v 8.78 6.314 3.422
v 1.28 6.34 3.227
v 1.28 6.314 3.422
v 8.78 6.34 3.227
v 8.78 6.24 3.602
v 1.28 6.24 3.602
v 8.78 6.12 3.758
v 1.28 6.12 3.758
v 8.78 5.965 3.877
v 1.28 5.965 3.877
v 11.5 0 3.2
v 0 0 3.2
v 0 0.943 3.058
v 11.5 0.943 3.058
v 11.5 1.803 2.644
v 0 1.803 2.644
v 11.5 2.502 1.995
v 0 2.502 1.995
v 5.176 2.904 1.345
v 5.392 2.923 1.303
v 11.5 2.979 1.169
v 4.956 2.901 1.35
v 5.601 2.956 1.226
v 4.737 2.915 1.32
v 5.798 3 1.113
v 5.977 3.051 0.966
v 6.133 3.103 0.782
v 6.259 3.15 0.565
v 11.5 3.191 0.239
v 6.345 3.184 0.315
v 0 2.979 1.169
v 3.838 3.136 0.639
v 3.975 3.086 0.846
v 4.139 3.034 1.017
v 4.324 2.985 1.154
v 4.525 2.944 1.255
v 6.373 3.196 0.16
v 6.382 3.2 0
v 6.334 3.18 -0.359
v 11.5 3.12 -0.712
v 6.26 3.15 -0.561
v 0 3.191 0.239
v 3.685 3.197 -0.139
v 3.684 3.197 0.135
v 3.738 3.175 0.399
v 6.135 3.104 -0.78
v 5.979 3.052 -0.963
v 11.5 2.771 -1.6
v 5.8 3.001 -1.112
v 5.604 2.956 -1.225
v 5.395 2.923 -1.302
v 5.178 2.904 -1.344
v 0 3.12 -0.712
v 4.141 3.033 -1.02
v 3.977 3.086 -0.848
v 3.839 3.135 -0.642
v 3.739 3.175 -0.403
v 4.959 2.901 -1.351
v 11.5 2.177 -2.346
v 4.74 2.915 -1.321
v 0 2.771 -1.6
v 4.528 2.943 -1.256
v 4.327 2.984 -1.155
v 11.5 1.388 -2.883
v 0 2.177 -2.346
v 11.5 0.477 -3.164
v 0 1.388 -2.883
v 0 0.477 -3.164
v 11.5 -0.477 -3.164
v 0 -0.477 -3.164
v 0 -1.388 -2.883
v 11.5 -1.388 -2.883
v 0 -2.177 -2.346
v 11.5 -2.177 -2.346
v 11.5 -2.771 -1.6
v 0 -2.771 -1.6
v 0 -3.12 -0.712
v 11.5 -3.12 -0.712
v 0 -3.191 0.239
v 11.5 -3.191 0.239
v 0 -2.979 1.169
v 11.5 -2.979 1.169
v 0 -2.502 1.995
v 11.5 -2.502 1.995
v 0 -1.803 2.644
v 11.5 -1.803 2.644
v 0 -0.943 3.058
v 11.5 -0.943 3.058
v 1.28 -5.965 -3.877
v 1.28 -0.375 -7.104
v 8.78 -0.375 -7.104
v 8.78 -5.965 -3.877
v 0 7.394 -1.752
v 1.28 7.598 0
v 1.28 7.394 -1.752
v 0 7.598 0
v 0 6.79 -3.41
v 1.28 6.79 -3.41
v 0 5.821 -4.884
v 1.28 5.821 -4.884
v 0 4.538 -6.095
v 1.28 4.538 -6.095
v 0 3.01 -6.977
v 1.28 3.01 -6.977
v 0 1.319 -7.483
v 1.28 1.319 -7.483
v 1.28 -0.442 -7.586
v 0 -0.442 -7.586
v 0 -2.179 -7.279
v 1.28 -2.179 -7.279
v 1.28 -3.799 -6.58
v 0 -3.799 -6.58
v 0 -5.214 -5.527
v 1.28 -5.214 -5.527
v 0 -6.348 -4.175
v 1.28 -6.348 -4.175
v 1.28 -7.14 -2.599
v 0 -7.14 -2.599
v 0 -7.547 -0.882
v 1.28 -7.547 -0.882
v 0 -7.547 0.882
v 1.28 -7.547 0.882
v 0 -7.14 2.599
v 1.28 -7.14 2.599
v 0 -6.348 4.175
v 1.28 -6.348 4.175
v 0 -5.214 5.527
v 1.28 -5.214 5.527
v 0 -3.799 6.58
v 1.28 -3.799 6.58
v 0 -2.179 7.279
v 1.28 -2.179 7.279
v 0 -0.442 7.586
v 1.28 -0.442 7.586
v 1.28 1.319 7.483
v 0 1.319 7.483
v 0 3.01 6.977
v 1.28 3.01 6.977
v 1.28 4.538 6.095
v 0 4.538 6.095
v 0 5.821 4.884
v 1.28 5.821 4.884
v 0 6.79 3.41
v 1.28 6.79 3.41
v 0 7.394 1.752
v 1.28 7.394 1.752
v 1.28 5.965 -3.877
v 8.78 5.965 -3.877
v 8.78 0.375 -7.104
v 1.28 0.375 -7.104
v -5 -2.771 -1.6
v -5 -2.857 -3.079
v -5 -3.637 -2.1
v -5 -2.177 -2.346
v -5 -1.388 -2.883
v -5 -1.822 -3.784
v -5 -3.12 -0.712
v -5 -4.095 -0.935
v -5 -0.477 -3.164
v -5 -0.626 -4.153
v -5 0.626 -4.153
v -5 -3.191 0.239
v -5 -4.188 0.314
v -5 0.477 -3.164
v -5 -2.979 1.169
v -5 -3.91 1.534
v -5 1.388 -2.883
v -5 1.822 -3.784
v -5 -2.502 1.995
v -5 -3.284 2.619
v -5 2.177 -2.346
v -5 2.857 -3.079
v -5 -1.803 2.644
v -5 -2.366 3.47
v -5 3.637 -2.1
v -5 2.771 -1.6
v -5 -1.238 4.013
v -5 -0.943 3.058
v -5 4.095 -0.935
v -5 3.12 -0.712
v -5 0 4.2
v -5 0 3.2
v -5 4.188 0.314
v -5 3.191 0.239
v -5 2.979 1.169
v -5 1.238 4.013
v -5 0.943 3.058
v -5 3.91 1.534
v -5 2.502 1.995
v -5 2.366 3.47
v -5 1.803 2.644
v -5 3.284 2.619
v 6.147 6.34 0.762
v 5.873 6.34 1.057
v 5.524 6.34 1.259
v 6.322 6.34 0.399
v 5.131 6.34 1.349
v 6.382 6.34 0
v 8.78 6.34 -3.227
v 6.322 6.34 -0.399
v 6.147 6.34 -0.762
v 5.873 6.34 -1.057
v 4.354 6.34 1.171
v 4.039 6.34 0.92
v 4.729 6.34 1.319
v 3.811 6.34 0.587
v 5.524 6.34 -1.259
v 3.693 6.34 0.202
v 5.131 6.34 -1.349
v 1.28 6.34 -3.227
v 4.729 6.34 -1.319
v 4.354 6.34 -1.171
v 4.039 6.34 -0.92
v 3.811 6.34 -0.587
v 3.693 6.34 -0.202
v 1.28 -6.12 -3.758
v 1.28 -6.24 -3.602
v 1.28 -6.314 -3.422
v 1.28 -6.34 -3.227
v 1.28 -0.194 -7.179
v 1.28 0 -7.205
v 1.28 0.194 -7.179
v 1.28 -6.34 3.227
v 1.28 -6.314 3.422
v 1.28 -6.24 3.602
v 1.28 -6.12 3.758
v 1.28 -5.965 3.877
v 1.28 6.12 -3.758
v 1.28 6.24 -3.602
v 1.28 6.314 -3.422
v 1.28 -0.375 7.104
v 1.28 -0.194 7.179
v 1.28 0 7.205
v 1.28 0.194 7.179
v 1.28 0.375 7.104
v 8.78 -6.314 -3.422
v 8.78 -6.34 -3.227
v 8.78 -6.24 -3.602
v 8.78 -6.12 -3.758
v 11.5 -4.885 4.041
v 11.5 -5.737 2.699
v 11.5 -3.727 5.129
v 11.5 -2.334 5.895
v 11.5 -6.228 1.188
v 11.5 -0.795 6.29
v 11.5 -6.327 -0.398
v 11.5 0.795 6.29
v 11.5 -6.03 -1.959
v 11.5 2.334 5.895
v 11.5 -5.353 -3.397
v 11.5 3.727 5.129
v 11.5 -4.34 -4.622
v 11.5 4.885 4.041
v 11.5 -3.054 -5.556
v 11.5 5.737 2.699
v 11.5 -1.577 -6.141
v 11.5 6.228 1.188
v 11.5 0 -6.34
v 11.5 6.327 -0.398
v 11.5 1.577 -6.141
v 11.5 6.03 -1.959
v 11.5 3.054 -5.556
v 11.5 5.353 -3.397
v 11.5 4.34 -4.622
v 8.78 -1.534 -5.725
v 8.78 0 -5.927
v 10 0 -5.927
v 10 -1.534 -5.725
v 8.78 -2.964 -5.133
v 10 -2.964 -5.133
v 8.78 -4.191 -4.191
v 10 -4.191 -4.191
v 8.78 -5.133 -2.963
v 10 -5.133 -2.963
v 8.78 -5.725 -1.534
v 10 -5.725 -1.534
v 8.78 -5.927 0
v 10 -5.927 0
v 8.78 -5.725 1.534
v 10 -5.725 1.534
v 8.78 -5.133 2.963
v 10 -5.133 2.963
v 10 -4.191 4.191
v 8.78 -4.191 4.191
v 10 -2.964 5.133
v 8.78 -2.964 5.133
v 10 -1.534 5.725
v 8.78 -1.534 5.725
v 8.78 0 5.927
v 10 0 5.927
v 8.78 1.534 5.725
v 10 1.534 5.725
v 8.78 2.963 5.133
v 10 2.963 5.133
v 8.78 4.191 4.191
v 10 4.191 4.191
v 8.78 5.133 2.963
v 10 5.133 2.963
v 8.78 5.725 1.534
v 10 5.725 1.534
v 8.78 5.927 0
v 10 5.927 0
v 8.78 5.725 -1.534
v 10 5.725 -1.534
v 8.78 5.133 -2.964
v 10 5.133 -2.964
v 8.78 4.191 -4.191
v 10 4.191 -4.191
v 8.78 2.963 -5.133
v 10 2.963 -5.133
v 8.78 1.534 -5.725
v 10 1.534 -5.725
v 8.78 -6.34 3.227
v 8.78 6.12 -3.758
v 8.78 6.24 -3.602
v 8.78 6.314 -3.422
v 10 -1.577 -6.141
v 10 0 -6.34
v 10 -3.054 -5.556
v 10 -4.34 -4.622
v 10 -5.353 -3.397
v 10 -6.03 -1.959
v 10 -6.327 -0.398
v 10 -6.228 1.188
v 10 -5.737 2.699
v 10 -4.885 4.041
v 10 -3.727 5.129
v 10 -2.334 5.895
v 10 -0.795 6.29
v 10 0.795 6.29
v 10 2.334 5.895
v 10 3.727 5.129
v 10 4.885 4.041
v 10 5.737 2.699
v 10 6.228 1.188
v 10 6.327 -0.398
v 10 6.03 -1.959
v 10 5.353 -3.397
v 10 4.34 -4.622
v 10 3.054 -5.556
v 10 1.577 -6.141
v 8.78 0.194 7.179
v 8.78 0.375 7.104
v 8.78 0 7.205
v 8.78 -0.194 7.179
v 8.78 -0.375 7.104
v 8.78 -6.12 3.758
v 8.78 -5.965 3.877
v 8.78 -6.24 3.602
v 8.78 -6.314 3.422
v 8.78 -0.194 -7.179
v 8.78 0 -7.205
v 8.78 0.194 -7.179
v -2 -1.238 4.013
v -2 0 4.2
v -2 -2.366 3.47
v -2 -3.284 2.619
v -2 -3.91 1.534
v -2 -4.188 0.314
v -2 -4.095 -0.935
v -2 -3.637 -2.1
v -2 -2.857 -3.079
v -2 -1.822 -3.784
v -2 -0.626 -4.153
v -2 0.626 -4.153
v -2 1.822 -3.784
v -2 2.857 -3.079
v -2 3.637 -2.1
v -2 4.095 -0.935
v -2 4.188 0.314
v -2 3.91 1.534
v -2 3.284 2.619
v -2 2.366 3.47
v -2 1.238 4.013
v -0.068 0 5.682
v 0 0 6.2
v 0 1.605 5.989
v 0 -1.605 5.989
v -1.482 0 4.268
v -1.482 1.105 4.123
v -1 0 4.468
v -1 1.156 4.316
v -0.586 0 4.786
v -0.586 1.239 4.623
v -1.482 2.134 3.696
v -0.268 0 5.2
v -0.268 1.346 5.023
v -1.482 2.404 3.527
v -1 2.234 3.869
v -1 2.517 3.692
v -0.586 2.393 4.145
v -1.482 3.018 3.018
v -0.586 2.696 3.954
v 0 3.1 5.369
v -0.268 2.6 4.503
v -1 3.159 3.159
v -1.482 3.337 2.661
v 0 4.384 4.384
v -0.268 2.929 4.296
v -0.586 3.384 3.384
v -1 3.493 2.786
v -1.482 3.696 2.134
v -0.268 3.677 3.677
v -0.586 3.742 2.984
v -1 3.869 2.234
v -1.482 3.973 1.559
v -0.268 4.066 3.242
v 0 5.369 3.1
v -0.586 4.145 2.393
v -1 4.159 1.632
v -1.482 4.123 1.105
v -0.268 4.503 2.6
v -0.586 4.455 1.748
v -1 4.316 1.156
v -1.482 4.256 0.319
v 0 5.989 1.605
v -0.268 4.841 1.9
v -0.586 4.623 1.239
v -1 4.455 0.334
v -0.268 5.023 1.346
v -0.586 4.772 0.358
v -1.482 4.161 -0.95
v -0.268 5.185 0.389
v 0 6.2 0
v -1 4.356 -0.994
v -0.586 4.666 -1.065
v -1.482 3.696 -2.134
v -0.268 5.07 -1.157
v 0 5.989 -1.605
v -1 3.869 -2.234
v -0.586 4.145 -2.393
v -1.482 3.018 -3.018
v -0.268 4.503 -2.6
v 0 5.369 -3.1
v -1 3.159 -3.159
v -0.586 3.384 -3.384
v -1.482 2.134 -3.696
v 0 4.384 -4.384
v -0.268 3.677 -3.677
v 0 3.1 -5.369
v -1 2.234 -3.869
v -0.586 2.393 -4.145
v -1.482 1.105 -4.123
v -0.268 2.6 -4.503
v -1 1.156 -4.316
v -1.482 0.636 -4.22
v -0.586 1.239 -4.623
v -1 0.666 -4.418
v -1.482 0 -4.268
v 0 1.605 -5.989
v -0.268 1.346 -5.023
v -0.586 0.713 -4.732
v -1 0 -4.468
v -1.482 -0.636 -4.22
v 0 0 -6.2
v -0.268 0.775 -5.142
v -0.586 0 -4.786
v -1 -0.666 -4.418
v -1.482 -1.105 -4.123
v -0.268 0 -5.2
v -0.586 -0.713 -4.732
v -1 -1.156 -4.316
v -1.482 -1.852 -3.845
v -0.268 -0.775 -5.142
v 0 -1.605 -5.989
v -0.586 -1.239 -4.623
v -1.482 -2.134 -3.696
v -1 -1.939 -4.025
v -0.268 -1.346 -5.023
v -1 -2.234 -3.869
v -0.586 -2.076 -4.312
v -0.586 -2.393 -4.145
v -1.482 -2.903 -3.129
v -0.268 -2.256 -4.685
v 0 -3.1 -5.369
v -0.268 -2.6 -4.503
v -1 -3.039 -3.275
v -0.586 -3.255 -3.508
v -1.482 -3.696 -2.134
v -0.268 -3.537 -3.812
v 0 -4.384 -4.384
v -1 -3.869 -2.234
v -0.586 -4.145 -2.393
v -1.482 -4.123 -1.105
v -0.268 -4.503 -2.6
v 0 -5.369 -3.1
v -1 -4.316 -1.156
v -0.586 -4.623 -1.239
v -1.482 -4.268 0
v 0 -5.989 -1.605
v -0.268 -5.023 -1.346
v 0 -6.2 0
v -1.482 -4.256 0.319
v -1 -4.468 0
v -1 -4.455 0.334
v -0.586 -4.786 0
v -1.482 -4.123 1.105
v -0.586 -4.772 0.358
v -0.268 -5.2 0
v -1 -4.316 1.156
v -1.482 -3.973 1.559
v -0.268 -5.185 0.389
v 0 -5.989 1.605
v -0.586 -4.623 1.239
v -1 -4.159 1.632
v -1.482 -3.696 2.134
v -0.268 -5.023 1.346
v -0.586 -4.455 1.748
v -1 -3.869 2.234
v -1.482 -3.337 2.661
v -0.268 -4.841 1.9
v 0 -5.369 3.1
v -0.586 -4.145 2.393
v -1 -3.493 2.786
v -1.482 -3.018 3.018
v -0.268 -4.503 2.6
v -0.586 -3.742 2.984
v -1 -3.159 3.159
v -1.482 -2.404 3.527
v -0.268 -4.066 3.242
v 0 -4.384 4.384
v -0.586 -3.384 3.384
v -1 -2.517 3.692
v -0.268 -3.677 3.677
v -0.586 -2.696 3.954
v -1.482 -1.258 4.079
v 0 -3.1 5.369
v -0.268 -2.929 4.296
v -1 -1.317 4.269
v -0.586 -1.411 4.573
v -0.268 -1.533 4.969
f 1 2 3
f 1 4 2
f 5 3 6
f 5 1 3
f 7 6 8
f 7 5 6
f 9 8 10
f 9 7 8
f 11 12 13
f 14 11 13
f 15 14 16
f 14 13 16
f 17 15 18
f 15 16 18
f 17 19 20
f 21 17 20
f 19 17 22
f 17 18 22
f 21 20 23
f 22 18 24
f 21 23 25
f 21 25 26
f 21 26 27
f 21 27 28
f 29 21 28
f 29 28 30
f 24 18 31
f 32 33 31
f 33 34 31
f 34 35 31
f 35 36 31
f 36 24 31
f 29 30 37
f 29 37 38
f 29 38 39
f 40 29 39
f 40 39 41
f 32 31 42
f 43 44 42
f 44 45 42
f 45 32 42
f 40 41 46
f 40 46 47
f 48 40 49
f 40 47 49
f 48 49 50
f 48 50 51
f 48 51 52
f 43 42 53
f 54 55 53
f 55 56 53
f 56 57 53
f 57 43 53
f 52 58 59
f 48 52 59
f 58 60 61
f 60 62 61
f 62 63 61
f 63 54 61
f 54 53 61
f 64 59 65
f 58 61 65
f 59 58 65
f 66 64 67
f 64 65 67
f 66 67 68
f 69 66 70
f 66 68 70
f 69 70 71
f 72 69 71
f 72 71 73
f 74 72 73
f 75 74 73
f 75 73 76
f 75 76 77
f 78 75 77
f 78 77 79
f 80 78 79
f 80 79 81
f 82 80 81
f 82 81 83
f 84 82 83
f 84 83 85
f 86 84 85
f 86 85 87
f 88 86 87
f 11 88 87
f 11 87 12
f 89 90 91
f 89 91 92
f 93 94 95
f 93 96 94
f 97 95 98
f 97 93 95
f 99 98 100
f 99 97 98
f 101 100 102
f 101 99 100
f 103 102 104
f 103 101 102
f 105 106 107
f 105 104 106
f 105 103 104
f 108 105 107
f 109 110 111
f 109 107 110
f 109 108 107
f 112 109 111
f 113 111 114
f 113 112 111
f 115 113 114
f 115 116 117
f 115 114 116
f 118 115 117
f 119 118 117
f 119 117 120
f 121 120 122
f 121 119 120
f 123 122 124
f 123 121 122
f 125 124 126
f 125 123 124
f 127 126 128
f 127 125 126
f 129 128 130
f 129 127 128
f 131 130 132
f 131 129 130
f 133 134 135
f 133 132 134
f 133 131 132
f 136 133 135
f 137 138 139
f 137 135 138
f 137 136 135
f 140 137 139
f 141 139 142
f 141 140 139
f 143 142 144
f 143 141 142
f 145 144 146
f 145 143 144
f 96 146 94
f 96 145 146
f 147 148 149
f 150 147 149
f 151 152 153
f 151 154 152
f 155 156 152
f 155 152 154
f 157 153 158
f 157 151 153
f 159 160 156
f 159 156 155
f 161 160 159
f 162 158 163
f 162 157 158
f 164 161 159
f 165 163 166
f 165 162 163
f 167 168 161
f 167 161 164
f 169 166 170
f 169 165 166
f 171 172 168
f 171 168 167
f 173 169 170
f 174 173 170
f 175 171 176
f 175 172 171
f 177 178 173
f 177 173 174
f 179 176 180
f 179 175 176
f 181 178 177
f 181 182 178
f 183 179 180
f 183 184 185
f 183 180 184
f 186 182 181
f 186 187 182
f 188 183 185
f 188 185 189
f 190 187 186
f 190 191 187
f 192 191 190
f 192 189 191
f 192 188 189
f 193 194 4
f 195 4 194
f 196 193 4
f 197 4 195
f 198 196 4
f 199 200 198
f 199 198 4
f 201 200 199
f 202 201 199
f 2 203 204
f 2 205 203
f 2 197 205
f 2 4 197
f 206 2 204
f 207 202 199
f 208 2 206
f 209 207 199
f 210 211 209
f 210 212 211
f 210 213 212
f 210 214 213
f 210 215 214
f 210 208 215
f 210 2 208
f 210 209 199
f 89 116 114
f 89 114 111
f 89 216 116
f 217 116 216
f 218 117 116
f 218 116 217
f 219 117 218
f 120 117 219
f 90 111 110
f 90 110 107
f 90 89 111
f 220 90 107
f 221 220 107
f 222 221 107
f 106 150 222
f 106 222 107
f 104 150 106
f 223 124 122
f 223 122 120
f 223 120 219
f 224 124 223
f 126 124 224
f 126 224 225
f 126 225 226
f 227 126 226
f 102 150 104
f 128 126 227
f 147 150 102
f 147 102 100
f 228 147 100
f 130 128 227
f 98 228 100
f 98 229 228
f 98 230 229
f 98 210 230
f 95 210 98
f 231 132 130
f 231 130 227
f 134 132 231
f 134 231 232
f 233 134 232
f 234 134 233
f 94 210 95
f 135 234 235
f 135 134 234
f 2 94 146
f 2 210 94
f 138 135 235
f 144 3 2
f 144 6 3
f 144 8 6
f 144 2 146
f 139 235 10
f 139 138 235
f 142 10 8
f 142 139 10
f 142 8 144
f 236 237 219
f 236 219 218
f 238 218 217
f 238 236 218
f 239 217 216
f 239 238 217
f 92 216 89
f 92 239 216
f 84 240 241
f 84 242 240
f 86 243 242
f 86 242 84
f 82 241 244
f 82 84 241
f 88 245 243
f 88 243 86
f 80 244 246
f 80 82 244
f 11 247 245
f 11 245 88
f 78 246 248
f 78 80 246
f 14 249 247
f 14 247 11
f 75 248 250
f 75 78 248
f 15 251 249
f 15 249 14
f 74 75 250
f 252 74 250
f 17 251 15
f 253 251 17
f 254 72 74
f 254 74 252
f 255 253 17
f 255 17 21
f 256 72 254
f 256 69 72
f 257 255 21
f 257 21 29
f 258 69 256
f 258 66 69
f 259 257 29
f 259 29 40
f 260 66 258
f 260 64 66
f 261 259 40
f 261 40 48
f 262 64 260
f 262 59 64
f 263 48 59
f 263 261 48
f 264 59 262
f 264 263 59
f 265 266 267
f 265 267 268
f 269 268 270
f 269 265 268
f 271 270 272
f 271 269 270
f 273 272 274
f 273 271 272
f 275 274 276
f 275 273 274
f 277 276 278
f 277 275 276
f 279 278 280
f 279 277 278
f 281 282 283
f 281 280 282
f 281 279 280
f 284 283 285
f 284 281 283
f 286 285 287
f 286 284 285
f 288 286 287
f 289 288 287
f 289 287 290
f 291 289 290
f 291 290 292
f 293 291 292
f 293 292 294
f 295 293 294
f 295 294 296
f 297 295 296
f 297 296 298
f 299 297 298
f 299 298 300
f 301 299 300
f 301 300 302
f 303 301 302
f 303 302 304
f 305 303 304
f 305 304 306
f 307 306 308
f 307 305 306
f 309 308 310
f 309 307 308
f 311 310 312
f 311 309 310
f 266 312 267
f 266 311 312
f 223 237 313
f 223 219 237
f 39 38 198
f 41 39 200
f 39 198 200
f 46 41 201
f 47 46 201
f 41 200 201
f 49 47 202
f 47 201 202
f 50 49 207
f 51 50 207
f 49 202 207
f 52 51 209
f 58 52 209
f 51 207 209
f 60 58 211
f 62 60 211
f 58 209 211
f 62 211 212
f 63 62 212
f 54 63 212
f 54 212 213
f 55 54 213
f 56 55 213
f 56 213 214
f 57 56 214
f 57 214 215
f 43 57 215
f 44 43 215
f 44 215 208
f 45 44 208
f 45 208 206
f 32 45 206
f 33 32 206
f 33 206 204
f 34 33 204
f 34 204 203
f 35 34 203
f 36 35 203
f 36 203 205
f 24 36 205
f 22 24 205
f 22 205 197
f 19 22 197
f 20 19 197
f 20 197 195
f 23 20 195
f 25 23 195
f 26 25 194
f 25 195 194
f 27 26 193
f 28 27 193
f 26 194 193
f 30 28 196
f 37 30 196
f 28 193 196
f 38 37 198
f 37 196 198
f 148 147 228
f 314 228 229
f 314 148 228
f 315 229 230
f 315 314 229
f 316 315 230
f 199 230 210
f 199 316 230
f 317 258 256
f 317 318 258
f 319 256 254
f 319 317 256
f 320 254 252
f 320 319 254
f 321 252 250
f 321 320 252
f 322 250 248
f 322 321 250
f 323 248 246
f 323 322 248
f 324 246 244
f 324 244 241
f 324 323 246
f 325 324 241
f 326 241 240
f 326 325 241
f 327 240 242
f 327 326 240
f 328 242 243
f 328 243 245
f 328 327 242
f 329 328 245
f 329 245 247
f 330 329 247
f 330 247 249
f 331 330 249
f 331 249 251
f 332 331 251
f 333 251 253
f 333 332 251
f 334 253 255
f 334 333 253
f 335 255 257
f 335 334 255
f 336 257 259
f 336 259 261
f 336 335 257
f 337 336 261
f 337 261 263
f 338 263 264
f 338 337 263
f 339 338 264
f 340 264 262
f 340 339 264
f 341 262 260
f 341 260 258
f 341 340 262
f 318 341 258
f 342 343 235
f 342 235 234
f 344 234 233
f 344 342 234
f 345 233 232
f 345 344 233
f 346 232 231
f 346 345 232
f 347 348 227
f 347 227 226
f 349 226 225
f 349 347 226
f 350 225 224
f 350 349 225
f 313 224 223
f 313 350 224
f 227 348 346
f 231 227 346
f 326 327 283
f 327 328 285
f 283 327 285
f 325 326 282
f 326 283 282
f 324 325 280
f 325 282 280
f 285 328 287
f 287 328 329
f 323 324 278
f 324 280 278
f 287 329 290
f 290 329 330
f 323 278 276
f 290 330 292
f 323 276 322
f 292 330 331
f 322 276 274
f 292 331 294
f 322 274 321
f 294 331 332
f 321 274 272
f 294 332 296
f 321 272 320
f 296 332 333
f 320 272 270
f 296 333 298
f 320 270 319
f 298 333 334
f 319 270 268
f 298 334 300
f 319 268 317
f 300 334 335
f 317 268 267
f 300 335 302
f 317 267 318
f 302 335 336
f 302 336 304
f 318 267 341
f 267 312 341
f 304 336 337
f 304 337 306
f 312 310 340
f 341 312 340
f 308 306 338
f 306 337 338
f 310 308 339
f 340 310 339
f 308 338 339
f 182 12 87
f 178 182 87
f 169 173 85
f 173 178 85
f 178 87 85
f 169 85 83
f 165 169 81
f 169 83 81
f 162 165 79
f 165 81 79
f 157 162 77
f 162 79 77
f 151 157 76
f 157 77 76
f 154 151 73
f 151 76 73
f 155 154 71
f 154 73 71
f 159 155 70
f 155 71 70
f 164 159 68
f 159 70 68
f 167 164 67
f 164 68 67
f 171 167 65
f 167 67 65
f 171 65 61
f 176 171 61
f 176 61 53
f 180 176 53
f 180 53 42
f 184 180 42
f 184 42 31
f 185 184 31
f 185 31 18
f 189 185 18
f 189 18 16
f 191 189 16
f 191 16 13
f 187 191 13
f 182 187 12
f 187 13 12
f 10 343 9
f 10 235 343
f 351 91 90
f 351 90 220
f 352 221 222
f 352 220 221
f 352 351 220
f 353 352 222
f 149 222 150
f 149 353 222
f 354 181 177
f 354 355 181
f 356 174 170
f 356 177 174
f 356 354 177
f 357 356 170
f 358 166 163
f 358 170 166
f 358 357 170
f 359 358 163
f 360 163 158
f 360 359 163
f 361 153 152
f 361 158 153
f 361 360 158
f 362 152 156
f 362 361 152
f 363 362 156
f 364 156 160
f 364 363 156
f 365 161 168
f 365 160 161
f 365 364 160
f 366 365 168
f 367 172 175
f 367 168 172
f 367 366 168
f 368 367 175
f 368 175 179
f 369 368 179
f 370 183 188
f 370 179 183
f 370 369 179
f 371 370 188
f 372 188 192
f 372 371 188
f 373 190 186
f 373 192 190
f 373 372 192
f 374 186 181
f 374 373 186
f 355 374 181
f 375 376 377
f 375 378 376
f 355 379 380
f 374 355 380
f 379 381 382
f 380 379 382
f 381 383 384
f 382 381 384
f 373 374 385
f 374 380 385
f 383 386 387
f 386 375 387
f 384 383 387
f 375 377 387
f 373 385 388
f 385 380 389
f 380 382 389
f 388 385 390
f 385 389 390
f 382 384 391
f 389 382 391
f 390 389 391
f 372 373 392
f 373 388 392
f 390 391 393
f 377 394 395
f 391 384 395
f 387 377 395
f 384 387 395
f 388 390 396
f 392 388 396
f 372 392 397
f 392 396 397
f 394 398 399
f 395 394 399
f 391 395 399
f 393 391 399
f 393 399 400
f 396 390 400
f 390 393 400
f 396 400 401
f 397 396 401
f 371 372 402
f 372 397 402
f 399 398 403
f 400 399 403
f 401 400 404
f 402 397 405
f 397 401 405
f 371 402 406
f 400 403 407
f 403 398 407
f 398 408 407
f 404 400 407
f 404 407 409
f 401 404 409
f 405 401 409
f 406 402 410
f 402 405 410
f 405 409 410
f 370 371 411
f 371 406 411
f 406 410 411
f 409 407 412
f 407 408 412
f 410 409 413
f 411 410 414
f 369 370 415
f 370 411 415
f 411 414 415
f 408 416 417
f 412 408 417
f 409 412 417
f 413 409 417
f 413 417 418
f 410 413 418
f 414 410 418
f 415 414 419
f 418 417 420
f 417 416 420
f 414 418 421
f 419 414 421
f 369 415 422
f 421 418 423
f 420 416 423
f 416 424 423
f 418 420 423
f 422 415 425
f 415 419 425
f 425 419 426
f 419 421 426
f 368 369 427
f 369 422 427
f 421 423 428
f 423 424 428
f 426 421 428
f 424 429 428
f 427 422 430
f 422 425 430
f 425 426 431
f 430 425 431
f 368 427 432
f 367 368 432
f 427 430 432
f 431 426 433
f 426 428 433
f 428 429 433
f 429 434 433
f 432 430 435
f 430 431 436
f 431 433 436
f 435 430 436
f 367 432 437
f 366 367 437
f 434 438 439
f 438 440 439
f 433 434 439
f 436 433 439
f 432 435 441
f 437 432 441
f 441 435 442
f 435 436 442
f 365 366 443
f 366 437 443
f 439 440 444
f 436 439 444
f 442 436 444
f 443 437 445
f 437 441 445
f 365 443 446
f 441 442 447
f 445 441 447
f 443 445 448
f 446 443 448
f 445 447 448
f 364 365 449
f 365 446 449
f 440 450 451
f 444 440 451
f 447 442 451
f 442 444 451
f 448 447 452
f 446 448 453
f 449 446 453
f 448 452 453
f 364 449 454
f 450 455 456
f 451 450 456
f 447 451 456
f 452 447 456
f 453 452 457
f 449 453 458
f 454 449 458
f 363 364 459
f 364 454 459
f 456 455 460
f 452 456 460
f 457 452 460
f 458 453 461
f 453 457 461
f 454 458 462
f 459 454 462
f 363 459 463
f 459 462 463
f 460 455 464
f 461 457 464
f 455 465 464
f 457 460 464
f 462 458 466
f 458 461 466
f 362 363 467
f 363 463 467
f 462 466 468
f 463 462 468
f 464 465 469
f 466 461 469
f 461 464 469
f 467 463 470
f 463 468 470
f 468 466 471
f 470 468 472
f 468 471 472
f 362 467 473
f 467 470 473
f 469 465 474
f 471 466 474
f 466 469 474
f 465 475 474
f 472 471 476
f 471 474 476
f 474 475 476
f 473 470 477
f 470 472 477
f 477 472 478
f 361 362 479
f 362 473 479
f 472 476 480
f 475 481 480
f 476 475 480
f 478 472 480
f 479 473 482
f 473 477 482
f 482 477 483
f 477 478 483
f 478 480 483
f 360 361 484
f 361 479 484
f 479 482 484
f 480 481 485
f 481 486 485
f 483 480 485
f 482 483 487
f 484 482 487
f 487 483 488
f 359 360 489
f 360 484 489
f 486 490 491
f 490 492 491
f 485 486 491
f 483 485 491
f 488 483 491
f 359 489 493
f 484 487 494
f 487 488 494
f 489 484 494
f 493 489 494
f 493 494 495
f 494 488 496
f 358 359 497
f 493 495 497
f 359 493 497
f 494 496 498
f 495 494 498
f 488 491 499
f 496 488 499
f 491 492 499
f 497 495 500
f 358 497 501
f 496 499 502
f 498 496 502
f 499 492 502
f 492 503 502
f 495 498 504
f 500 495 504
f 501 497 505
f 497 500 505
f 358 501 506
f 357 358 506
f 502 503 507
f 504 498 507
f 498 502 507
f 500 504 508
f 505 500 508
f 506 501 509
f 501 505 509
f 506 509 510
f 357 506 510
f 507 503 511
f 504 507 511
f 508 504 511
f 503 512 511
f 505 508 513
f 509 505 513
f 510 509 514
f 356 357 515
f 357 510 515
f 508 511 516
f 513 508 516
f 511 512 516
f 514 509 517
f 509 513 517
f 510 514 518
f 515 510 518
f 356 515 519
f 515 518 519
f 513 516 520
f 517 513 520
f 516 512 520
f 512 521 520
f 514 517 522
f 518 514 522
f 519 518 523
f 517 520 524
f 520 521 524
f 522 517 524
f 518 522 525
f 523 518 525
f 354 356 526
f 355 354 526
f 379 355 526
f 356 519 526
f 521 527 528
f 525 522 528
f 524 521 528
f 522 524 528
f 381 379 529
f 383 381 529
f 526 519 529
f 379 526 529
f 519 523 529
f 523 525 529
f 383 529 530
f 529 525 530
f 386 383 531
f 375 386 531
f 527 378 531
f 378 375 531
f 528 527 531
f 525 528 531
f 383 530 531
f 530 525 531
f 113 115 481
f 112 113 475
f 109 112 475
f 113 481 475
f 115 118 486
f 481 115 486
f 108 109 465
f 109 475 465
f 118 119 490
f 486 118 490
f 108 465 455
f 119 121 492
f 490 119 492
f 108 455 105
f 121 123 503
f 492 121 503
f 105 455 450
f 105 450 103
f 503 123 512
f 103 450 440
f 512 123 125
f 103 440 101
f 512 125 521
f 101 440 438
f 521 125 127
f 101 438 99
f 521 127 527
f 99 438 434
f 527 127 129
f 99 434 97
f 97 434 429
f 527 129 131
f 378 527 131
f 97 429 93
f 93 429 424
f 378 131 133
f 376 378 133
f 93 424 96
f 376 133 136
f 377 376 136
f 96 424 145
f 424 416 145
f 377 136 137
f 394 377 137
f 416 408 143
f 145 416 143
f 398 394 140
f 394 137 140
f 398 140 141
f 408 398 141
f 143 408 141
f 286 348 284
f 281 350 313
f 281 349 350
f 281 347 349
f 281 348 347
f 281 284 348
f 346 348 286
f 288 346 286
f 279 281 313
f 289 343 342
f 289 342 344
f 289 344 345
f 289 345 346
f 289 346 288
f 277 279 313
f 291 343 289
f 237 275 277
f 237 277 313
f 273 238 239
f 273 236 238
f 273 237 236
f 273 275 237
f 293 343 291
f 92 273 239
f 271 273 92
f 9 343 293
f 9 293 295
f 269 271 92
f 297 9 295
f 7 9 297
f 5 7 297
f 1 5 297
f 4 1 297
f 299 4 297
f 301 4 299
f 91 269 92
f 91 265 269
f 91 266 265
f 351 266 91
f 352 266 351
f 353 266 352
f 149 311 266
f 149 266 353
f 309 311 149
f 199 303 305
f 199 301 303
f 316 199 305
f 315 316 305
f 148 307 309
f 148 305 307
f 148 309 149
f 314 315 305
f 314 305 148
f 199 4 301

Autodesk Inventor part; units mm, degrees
ref_plane "YZ Plane" through (0, 0, 0) normal (1, 0, 0) x (0, 1, 0)
ref_plane "XZ Plane" through (0, 0, 0) normal (0, 1, 0) x (-1, 0, 0)
ref_plane "XY Plane" through (0, 0, 0) normal (0, 0, 1) x (1, 0, 0)
sketch "Sketch1" plane through (0, 0, 0) normal (1, 0, 0) x (0, 1, 0)
  circle A0 centre (0, 0) radius 7.5985
  dimension "d0" = 15.197
extrude "Extrusion1" add sketch "Sketch1" along normal blind 1.28
sketch "Sketch2" plane through (1.28, 0, 0) normal (1, 0, 0) x (0, 0, -1)
  line L0 (3.6604, 6.34) -> (7.3208, 0)
  line L1 (7.3208, 0) -> (3.6604, -6.34)
  line L2 (3.6604, -6.34) -> (-3.6604, -6.34)
  line L3 (-3.6604, -6.34) -> (-7.3208, 0)
  line L4 (-7.3208, 0) -> (-3.6604, 6.34)
  line L5 (-3.6604, 6.34) -> (3.6604, 6.34)
  point P0 (0, 0)
  point P1 (0, 6.34)
  point P2 (0, 0)
extrude "Extrusion2" add sketch "Sketch2" along normal blind 7.5
sketch "Sketch3" plane through (8.78, 0, 0) normal (1, 0, 0) x (0, 0, -1)
  circle A0 centre (0, 0) radius 5.927
  dimension "d5" = 11.854
extrude "Extrusion3" add sketch "Sketch3" along normal blind 1.22
sketch "Sketch4" plane through (10, 0, 0) normal (1, 0, 0) x (0, 0, -1)
  circle A0 centre (0, 0) radius 6.34
  line L0 (3.6604, 6.34) -> (-3.6604, 6.34) projected
extrude "Extrusion4" add sketch "Sketch4" along normal blind 1.5
fillet "Fillet1" radius 0.75 5 edges at (5.03, 0, -7.3208) (5.03, -6.34, -3.6604) (5.03, 0, 7.3208) (5.03, 6.34, -3.6604) (5.03, 6.34, 3.6604)
fillet "Fillet2" radius 0.75 1 edges at (5.03, -6.34, 3.6604)
sketch "Sketch5" plane through (0, 0, 0) normal (-1, 0, 0) x (0, 0, 1)
  point P0 (0, 0)
sketch "Sketch6" plane through (1.28, 6.34, 3.2274) normal (0, 1, 0) x (1, 0, 0)
  circle A0 centre (3.75, 3.2274) radius 1.3525
  point P0 (-1.28, 3.2274)
  dimension "d12" = 2.705
extrude "Extrusion5" cut sketch "Sketch6" against normal blind 6.5
sketch "Sketch7" plane through (0, 0, 0) normal (-1, 0, 0) x (0, 0, 1)
  circle A0 centre (0, 0) radius 3.2
  dimension "d15" = 6.4
sketch "Sketch8" plane through (5.03, -0.16, 0) normal (0, 1, 0) x (1, 0, 0)
  point P0 (-5.03, 0)
extrude "Extrusion6" cut sketch "Sketch7" against normal blind 11.75
sketch "Sketch9" plane through (0, 0, 0) normal (-1, 0, 0) x (0, 0, 1)
  circle A0 centre (0, 0) radius 3.2
  circle A1 centre (0, 0) radius 4.2
  dimension "d18" = 8.4
extrude "Extrusion7" add sketch "Sketch9" along normal blind 5
fillet "Fillet3" radius 2 1 edges at (0, 0, -4.2)
properties part number "_3DPrint"
